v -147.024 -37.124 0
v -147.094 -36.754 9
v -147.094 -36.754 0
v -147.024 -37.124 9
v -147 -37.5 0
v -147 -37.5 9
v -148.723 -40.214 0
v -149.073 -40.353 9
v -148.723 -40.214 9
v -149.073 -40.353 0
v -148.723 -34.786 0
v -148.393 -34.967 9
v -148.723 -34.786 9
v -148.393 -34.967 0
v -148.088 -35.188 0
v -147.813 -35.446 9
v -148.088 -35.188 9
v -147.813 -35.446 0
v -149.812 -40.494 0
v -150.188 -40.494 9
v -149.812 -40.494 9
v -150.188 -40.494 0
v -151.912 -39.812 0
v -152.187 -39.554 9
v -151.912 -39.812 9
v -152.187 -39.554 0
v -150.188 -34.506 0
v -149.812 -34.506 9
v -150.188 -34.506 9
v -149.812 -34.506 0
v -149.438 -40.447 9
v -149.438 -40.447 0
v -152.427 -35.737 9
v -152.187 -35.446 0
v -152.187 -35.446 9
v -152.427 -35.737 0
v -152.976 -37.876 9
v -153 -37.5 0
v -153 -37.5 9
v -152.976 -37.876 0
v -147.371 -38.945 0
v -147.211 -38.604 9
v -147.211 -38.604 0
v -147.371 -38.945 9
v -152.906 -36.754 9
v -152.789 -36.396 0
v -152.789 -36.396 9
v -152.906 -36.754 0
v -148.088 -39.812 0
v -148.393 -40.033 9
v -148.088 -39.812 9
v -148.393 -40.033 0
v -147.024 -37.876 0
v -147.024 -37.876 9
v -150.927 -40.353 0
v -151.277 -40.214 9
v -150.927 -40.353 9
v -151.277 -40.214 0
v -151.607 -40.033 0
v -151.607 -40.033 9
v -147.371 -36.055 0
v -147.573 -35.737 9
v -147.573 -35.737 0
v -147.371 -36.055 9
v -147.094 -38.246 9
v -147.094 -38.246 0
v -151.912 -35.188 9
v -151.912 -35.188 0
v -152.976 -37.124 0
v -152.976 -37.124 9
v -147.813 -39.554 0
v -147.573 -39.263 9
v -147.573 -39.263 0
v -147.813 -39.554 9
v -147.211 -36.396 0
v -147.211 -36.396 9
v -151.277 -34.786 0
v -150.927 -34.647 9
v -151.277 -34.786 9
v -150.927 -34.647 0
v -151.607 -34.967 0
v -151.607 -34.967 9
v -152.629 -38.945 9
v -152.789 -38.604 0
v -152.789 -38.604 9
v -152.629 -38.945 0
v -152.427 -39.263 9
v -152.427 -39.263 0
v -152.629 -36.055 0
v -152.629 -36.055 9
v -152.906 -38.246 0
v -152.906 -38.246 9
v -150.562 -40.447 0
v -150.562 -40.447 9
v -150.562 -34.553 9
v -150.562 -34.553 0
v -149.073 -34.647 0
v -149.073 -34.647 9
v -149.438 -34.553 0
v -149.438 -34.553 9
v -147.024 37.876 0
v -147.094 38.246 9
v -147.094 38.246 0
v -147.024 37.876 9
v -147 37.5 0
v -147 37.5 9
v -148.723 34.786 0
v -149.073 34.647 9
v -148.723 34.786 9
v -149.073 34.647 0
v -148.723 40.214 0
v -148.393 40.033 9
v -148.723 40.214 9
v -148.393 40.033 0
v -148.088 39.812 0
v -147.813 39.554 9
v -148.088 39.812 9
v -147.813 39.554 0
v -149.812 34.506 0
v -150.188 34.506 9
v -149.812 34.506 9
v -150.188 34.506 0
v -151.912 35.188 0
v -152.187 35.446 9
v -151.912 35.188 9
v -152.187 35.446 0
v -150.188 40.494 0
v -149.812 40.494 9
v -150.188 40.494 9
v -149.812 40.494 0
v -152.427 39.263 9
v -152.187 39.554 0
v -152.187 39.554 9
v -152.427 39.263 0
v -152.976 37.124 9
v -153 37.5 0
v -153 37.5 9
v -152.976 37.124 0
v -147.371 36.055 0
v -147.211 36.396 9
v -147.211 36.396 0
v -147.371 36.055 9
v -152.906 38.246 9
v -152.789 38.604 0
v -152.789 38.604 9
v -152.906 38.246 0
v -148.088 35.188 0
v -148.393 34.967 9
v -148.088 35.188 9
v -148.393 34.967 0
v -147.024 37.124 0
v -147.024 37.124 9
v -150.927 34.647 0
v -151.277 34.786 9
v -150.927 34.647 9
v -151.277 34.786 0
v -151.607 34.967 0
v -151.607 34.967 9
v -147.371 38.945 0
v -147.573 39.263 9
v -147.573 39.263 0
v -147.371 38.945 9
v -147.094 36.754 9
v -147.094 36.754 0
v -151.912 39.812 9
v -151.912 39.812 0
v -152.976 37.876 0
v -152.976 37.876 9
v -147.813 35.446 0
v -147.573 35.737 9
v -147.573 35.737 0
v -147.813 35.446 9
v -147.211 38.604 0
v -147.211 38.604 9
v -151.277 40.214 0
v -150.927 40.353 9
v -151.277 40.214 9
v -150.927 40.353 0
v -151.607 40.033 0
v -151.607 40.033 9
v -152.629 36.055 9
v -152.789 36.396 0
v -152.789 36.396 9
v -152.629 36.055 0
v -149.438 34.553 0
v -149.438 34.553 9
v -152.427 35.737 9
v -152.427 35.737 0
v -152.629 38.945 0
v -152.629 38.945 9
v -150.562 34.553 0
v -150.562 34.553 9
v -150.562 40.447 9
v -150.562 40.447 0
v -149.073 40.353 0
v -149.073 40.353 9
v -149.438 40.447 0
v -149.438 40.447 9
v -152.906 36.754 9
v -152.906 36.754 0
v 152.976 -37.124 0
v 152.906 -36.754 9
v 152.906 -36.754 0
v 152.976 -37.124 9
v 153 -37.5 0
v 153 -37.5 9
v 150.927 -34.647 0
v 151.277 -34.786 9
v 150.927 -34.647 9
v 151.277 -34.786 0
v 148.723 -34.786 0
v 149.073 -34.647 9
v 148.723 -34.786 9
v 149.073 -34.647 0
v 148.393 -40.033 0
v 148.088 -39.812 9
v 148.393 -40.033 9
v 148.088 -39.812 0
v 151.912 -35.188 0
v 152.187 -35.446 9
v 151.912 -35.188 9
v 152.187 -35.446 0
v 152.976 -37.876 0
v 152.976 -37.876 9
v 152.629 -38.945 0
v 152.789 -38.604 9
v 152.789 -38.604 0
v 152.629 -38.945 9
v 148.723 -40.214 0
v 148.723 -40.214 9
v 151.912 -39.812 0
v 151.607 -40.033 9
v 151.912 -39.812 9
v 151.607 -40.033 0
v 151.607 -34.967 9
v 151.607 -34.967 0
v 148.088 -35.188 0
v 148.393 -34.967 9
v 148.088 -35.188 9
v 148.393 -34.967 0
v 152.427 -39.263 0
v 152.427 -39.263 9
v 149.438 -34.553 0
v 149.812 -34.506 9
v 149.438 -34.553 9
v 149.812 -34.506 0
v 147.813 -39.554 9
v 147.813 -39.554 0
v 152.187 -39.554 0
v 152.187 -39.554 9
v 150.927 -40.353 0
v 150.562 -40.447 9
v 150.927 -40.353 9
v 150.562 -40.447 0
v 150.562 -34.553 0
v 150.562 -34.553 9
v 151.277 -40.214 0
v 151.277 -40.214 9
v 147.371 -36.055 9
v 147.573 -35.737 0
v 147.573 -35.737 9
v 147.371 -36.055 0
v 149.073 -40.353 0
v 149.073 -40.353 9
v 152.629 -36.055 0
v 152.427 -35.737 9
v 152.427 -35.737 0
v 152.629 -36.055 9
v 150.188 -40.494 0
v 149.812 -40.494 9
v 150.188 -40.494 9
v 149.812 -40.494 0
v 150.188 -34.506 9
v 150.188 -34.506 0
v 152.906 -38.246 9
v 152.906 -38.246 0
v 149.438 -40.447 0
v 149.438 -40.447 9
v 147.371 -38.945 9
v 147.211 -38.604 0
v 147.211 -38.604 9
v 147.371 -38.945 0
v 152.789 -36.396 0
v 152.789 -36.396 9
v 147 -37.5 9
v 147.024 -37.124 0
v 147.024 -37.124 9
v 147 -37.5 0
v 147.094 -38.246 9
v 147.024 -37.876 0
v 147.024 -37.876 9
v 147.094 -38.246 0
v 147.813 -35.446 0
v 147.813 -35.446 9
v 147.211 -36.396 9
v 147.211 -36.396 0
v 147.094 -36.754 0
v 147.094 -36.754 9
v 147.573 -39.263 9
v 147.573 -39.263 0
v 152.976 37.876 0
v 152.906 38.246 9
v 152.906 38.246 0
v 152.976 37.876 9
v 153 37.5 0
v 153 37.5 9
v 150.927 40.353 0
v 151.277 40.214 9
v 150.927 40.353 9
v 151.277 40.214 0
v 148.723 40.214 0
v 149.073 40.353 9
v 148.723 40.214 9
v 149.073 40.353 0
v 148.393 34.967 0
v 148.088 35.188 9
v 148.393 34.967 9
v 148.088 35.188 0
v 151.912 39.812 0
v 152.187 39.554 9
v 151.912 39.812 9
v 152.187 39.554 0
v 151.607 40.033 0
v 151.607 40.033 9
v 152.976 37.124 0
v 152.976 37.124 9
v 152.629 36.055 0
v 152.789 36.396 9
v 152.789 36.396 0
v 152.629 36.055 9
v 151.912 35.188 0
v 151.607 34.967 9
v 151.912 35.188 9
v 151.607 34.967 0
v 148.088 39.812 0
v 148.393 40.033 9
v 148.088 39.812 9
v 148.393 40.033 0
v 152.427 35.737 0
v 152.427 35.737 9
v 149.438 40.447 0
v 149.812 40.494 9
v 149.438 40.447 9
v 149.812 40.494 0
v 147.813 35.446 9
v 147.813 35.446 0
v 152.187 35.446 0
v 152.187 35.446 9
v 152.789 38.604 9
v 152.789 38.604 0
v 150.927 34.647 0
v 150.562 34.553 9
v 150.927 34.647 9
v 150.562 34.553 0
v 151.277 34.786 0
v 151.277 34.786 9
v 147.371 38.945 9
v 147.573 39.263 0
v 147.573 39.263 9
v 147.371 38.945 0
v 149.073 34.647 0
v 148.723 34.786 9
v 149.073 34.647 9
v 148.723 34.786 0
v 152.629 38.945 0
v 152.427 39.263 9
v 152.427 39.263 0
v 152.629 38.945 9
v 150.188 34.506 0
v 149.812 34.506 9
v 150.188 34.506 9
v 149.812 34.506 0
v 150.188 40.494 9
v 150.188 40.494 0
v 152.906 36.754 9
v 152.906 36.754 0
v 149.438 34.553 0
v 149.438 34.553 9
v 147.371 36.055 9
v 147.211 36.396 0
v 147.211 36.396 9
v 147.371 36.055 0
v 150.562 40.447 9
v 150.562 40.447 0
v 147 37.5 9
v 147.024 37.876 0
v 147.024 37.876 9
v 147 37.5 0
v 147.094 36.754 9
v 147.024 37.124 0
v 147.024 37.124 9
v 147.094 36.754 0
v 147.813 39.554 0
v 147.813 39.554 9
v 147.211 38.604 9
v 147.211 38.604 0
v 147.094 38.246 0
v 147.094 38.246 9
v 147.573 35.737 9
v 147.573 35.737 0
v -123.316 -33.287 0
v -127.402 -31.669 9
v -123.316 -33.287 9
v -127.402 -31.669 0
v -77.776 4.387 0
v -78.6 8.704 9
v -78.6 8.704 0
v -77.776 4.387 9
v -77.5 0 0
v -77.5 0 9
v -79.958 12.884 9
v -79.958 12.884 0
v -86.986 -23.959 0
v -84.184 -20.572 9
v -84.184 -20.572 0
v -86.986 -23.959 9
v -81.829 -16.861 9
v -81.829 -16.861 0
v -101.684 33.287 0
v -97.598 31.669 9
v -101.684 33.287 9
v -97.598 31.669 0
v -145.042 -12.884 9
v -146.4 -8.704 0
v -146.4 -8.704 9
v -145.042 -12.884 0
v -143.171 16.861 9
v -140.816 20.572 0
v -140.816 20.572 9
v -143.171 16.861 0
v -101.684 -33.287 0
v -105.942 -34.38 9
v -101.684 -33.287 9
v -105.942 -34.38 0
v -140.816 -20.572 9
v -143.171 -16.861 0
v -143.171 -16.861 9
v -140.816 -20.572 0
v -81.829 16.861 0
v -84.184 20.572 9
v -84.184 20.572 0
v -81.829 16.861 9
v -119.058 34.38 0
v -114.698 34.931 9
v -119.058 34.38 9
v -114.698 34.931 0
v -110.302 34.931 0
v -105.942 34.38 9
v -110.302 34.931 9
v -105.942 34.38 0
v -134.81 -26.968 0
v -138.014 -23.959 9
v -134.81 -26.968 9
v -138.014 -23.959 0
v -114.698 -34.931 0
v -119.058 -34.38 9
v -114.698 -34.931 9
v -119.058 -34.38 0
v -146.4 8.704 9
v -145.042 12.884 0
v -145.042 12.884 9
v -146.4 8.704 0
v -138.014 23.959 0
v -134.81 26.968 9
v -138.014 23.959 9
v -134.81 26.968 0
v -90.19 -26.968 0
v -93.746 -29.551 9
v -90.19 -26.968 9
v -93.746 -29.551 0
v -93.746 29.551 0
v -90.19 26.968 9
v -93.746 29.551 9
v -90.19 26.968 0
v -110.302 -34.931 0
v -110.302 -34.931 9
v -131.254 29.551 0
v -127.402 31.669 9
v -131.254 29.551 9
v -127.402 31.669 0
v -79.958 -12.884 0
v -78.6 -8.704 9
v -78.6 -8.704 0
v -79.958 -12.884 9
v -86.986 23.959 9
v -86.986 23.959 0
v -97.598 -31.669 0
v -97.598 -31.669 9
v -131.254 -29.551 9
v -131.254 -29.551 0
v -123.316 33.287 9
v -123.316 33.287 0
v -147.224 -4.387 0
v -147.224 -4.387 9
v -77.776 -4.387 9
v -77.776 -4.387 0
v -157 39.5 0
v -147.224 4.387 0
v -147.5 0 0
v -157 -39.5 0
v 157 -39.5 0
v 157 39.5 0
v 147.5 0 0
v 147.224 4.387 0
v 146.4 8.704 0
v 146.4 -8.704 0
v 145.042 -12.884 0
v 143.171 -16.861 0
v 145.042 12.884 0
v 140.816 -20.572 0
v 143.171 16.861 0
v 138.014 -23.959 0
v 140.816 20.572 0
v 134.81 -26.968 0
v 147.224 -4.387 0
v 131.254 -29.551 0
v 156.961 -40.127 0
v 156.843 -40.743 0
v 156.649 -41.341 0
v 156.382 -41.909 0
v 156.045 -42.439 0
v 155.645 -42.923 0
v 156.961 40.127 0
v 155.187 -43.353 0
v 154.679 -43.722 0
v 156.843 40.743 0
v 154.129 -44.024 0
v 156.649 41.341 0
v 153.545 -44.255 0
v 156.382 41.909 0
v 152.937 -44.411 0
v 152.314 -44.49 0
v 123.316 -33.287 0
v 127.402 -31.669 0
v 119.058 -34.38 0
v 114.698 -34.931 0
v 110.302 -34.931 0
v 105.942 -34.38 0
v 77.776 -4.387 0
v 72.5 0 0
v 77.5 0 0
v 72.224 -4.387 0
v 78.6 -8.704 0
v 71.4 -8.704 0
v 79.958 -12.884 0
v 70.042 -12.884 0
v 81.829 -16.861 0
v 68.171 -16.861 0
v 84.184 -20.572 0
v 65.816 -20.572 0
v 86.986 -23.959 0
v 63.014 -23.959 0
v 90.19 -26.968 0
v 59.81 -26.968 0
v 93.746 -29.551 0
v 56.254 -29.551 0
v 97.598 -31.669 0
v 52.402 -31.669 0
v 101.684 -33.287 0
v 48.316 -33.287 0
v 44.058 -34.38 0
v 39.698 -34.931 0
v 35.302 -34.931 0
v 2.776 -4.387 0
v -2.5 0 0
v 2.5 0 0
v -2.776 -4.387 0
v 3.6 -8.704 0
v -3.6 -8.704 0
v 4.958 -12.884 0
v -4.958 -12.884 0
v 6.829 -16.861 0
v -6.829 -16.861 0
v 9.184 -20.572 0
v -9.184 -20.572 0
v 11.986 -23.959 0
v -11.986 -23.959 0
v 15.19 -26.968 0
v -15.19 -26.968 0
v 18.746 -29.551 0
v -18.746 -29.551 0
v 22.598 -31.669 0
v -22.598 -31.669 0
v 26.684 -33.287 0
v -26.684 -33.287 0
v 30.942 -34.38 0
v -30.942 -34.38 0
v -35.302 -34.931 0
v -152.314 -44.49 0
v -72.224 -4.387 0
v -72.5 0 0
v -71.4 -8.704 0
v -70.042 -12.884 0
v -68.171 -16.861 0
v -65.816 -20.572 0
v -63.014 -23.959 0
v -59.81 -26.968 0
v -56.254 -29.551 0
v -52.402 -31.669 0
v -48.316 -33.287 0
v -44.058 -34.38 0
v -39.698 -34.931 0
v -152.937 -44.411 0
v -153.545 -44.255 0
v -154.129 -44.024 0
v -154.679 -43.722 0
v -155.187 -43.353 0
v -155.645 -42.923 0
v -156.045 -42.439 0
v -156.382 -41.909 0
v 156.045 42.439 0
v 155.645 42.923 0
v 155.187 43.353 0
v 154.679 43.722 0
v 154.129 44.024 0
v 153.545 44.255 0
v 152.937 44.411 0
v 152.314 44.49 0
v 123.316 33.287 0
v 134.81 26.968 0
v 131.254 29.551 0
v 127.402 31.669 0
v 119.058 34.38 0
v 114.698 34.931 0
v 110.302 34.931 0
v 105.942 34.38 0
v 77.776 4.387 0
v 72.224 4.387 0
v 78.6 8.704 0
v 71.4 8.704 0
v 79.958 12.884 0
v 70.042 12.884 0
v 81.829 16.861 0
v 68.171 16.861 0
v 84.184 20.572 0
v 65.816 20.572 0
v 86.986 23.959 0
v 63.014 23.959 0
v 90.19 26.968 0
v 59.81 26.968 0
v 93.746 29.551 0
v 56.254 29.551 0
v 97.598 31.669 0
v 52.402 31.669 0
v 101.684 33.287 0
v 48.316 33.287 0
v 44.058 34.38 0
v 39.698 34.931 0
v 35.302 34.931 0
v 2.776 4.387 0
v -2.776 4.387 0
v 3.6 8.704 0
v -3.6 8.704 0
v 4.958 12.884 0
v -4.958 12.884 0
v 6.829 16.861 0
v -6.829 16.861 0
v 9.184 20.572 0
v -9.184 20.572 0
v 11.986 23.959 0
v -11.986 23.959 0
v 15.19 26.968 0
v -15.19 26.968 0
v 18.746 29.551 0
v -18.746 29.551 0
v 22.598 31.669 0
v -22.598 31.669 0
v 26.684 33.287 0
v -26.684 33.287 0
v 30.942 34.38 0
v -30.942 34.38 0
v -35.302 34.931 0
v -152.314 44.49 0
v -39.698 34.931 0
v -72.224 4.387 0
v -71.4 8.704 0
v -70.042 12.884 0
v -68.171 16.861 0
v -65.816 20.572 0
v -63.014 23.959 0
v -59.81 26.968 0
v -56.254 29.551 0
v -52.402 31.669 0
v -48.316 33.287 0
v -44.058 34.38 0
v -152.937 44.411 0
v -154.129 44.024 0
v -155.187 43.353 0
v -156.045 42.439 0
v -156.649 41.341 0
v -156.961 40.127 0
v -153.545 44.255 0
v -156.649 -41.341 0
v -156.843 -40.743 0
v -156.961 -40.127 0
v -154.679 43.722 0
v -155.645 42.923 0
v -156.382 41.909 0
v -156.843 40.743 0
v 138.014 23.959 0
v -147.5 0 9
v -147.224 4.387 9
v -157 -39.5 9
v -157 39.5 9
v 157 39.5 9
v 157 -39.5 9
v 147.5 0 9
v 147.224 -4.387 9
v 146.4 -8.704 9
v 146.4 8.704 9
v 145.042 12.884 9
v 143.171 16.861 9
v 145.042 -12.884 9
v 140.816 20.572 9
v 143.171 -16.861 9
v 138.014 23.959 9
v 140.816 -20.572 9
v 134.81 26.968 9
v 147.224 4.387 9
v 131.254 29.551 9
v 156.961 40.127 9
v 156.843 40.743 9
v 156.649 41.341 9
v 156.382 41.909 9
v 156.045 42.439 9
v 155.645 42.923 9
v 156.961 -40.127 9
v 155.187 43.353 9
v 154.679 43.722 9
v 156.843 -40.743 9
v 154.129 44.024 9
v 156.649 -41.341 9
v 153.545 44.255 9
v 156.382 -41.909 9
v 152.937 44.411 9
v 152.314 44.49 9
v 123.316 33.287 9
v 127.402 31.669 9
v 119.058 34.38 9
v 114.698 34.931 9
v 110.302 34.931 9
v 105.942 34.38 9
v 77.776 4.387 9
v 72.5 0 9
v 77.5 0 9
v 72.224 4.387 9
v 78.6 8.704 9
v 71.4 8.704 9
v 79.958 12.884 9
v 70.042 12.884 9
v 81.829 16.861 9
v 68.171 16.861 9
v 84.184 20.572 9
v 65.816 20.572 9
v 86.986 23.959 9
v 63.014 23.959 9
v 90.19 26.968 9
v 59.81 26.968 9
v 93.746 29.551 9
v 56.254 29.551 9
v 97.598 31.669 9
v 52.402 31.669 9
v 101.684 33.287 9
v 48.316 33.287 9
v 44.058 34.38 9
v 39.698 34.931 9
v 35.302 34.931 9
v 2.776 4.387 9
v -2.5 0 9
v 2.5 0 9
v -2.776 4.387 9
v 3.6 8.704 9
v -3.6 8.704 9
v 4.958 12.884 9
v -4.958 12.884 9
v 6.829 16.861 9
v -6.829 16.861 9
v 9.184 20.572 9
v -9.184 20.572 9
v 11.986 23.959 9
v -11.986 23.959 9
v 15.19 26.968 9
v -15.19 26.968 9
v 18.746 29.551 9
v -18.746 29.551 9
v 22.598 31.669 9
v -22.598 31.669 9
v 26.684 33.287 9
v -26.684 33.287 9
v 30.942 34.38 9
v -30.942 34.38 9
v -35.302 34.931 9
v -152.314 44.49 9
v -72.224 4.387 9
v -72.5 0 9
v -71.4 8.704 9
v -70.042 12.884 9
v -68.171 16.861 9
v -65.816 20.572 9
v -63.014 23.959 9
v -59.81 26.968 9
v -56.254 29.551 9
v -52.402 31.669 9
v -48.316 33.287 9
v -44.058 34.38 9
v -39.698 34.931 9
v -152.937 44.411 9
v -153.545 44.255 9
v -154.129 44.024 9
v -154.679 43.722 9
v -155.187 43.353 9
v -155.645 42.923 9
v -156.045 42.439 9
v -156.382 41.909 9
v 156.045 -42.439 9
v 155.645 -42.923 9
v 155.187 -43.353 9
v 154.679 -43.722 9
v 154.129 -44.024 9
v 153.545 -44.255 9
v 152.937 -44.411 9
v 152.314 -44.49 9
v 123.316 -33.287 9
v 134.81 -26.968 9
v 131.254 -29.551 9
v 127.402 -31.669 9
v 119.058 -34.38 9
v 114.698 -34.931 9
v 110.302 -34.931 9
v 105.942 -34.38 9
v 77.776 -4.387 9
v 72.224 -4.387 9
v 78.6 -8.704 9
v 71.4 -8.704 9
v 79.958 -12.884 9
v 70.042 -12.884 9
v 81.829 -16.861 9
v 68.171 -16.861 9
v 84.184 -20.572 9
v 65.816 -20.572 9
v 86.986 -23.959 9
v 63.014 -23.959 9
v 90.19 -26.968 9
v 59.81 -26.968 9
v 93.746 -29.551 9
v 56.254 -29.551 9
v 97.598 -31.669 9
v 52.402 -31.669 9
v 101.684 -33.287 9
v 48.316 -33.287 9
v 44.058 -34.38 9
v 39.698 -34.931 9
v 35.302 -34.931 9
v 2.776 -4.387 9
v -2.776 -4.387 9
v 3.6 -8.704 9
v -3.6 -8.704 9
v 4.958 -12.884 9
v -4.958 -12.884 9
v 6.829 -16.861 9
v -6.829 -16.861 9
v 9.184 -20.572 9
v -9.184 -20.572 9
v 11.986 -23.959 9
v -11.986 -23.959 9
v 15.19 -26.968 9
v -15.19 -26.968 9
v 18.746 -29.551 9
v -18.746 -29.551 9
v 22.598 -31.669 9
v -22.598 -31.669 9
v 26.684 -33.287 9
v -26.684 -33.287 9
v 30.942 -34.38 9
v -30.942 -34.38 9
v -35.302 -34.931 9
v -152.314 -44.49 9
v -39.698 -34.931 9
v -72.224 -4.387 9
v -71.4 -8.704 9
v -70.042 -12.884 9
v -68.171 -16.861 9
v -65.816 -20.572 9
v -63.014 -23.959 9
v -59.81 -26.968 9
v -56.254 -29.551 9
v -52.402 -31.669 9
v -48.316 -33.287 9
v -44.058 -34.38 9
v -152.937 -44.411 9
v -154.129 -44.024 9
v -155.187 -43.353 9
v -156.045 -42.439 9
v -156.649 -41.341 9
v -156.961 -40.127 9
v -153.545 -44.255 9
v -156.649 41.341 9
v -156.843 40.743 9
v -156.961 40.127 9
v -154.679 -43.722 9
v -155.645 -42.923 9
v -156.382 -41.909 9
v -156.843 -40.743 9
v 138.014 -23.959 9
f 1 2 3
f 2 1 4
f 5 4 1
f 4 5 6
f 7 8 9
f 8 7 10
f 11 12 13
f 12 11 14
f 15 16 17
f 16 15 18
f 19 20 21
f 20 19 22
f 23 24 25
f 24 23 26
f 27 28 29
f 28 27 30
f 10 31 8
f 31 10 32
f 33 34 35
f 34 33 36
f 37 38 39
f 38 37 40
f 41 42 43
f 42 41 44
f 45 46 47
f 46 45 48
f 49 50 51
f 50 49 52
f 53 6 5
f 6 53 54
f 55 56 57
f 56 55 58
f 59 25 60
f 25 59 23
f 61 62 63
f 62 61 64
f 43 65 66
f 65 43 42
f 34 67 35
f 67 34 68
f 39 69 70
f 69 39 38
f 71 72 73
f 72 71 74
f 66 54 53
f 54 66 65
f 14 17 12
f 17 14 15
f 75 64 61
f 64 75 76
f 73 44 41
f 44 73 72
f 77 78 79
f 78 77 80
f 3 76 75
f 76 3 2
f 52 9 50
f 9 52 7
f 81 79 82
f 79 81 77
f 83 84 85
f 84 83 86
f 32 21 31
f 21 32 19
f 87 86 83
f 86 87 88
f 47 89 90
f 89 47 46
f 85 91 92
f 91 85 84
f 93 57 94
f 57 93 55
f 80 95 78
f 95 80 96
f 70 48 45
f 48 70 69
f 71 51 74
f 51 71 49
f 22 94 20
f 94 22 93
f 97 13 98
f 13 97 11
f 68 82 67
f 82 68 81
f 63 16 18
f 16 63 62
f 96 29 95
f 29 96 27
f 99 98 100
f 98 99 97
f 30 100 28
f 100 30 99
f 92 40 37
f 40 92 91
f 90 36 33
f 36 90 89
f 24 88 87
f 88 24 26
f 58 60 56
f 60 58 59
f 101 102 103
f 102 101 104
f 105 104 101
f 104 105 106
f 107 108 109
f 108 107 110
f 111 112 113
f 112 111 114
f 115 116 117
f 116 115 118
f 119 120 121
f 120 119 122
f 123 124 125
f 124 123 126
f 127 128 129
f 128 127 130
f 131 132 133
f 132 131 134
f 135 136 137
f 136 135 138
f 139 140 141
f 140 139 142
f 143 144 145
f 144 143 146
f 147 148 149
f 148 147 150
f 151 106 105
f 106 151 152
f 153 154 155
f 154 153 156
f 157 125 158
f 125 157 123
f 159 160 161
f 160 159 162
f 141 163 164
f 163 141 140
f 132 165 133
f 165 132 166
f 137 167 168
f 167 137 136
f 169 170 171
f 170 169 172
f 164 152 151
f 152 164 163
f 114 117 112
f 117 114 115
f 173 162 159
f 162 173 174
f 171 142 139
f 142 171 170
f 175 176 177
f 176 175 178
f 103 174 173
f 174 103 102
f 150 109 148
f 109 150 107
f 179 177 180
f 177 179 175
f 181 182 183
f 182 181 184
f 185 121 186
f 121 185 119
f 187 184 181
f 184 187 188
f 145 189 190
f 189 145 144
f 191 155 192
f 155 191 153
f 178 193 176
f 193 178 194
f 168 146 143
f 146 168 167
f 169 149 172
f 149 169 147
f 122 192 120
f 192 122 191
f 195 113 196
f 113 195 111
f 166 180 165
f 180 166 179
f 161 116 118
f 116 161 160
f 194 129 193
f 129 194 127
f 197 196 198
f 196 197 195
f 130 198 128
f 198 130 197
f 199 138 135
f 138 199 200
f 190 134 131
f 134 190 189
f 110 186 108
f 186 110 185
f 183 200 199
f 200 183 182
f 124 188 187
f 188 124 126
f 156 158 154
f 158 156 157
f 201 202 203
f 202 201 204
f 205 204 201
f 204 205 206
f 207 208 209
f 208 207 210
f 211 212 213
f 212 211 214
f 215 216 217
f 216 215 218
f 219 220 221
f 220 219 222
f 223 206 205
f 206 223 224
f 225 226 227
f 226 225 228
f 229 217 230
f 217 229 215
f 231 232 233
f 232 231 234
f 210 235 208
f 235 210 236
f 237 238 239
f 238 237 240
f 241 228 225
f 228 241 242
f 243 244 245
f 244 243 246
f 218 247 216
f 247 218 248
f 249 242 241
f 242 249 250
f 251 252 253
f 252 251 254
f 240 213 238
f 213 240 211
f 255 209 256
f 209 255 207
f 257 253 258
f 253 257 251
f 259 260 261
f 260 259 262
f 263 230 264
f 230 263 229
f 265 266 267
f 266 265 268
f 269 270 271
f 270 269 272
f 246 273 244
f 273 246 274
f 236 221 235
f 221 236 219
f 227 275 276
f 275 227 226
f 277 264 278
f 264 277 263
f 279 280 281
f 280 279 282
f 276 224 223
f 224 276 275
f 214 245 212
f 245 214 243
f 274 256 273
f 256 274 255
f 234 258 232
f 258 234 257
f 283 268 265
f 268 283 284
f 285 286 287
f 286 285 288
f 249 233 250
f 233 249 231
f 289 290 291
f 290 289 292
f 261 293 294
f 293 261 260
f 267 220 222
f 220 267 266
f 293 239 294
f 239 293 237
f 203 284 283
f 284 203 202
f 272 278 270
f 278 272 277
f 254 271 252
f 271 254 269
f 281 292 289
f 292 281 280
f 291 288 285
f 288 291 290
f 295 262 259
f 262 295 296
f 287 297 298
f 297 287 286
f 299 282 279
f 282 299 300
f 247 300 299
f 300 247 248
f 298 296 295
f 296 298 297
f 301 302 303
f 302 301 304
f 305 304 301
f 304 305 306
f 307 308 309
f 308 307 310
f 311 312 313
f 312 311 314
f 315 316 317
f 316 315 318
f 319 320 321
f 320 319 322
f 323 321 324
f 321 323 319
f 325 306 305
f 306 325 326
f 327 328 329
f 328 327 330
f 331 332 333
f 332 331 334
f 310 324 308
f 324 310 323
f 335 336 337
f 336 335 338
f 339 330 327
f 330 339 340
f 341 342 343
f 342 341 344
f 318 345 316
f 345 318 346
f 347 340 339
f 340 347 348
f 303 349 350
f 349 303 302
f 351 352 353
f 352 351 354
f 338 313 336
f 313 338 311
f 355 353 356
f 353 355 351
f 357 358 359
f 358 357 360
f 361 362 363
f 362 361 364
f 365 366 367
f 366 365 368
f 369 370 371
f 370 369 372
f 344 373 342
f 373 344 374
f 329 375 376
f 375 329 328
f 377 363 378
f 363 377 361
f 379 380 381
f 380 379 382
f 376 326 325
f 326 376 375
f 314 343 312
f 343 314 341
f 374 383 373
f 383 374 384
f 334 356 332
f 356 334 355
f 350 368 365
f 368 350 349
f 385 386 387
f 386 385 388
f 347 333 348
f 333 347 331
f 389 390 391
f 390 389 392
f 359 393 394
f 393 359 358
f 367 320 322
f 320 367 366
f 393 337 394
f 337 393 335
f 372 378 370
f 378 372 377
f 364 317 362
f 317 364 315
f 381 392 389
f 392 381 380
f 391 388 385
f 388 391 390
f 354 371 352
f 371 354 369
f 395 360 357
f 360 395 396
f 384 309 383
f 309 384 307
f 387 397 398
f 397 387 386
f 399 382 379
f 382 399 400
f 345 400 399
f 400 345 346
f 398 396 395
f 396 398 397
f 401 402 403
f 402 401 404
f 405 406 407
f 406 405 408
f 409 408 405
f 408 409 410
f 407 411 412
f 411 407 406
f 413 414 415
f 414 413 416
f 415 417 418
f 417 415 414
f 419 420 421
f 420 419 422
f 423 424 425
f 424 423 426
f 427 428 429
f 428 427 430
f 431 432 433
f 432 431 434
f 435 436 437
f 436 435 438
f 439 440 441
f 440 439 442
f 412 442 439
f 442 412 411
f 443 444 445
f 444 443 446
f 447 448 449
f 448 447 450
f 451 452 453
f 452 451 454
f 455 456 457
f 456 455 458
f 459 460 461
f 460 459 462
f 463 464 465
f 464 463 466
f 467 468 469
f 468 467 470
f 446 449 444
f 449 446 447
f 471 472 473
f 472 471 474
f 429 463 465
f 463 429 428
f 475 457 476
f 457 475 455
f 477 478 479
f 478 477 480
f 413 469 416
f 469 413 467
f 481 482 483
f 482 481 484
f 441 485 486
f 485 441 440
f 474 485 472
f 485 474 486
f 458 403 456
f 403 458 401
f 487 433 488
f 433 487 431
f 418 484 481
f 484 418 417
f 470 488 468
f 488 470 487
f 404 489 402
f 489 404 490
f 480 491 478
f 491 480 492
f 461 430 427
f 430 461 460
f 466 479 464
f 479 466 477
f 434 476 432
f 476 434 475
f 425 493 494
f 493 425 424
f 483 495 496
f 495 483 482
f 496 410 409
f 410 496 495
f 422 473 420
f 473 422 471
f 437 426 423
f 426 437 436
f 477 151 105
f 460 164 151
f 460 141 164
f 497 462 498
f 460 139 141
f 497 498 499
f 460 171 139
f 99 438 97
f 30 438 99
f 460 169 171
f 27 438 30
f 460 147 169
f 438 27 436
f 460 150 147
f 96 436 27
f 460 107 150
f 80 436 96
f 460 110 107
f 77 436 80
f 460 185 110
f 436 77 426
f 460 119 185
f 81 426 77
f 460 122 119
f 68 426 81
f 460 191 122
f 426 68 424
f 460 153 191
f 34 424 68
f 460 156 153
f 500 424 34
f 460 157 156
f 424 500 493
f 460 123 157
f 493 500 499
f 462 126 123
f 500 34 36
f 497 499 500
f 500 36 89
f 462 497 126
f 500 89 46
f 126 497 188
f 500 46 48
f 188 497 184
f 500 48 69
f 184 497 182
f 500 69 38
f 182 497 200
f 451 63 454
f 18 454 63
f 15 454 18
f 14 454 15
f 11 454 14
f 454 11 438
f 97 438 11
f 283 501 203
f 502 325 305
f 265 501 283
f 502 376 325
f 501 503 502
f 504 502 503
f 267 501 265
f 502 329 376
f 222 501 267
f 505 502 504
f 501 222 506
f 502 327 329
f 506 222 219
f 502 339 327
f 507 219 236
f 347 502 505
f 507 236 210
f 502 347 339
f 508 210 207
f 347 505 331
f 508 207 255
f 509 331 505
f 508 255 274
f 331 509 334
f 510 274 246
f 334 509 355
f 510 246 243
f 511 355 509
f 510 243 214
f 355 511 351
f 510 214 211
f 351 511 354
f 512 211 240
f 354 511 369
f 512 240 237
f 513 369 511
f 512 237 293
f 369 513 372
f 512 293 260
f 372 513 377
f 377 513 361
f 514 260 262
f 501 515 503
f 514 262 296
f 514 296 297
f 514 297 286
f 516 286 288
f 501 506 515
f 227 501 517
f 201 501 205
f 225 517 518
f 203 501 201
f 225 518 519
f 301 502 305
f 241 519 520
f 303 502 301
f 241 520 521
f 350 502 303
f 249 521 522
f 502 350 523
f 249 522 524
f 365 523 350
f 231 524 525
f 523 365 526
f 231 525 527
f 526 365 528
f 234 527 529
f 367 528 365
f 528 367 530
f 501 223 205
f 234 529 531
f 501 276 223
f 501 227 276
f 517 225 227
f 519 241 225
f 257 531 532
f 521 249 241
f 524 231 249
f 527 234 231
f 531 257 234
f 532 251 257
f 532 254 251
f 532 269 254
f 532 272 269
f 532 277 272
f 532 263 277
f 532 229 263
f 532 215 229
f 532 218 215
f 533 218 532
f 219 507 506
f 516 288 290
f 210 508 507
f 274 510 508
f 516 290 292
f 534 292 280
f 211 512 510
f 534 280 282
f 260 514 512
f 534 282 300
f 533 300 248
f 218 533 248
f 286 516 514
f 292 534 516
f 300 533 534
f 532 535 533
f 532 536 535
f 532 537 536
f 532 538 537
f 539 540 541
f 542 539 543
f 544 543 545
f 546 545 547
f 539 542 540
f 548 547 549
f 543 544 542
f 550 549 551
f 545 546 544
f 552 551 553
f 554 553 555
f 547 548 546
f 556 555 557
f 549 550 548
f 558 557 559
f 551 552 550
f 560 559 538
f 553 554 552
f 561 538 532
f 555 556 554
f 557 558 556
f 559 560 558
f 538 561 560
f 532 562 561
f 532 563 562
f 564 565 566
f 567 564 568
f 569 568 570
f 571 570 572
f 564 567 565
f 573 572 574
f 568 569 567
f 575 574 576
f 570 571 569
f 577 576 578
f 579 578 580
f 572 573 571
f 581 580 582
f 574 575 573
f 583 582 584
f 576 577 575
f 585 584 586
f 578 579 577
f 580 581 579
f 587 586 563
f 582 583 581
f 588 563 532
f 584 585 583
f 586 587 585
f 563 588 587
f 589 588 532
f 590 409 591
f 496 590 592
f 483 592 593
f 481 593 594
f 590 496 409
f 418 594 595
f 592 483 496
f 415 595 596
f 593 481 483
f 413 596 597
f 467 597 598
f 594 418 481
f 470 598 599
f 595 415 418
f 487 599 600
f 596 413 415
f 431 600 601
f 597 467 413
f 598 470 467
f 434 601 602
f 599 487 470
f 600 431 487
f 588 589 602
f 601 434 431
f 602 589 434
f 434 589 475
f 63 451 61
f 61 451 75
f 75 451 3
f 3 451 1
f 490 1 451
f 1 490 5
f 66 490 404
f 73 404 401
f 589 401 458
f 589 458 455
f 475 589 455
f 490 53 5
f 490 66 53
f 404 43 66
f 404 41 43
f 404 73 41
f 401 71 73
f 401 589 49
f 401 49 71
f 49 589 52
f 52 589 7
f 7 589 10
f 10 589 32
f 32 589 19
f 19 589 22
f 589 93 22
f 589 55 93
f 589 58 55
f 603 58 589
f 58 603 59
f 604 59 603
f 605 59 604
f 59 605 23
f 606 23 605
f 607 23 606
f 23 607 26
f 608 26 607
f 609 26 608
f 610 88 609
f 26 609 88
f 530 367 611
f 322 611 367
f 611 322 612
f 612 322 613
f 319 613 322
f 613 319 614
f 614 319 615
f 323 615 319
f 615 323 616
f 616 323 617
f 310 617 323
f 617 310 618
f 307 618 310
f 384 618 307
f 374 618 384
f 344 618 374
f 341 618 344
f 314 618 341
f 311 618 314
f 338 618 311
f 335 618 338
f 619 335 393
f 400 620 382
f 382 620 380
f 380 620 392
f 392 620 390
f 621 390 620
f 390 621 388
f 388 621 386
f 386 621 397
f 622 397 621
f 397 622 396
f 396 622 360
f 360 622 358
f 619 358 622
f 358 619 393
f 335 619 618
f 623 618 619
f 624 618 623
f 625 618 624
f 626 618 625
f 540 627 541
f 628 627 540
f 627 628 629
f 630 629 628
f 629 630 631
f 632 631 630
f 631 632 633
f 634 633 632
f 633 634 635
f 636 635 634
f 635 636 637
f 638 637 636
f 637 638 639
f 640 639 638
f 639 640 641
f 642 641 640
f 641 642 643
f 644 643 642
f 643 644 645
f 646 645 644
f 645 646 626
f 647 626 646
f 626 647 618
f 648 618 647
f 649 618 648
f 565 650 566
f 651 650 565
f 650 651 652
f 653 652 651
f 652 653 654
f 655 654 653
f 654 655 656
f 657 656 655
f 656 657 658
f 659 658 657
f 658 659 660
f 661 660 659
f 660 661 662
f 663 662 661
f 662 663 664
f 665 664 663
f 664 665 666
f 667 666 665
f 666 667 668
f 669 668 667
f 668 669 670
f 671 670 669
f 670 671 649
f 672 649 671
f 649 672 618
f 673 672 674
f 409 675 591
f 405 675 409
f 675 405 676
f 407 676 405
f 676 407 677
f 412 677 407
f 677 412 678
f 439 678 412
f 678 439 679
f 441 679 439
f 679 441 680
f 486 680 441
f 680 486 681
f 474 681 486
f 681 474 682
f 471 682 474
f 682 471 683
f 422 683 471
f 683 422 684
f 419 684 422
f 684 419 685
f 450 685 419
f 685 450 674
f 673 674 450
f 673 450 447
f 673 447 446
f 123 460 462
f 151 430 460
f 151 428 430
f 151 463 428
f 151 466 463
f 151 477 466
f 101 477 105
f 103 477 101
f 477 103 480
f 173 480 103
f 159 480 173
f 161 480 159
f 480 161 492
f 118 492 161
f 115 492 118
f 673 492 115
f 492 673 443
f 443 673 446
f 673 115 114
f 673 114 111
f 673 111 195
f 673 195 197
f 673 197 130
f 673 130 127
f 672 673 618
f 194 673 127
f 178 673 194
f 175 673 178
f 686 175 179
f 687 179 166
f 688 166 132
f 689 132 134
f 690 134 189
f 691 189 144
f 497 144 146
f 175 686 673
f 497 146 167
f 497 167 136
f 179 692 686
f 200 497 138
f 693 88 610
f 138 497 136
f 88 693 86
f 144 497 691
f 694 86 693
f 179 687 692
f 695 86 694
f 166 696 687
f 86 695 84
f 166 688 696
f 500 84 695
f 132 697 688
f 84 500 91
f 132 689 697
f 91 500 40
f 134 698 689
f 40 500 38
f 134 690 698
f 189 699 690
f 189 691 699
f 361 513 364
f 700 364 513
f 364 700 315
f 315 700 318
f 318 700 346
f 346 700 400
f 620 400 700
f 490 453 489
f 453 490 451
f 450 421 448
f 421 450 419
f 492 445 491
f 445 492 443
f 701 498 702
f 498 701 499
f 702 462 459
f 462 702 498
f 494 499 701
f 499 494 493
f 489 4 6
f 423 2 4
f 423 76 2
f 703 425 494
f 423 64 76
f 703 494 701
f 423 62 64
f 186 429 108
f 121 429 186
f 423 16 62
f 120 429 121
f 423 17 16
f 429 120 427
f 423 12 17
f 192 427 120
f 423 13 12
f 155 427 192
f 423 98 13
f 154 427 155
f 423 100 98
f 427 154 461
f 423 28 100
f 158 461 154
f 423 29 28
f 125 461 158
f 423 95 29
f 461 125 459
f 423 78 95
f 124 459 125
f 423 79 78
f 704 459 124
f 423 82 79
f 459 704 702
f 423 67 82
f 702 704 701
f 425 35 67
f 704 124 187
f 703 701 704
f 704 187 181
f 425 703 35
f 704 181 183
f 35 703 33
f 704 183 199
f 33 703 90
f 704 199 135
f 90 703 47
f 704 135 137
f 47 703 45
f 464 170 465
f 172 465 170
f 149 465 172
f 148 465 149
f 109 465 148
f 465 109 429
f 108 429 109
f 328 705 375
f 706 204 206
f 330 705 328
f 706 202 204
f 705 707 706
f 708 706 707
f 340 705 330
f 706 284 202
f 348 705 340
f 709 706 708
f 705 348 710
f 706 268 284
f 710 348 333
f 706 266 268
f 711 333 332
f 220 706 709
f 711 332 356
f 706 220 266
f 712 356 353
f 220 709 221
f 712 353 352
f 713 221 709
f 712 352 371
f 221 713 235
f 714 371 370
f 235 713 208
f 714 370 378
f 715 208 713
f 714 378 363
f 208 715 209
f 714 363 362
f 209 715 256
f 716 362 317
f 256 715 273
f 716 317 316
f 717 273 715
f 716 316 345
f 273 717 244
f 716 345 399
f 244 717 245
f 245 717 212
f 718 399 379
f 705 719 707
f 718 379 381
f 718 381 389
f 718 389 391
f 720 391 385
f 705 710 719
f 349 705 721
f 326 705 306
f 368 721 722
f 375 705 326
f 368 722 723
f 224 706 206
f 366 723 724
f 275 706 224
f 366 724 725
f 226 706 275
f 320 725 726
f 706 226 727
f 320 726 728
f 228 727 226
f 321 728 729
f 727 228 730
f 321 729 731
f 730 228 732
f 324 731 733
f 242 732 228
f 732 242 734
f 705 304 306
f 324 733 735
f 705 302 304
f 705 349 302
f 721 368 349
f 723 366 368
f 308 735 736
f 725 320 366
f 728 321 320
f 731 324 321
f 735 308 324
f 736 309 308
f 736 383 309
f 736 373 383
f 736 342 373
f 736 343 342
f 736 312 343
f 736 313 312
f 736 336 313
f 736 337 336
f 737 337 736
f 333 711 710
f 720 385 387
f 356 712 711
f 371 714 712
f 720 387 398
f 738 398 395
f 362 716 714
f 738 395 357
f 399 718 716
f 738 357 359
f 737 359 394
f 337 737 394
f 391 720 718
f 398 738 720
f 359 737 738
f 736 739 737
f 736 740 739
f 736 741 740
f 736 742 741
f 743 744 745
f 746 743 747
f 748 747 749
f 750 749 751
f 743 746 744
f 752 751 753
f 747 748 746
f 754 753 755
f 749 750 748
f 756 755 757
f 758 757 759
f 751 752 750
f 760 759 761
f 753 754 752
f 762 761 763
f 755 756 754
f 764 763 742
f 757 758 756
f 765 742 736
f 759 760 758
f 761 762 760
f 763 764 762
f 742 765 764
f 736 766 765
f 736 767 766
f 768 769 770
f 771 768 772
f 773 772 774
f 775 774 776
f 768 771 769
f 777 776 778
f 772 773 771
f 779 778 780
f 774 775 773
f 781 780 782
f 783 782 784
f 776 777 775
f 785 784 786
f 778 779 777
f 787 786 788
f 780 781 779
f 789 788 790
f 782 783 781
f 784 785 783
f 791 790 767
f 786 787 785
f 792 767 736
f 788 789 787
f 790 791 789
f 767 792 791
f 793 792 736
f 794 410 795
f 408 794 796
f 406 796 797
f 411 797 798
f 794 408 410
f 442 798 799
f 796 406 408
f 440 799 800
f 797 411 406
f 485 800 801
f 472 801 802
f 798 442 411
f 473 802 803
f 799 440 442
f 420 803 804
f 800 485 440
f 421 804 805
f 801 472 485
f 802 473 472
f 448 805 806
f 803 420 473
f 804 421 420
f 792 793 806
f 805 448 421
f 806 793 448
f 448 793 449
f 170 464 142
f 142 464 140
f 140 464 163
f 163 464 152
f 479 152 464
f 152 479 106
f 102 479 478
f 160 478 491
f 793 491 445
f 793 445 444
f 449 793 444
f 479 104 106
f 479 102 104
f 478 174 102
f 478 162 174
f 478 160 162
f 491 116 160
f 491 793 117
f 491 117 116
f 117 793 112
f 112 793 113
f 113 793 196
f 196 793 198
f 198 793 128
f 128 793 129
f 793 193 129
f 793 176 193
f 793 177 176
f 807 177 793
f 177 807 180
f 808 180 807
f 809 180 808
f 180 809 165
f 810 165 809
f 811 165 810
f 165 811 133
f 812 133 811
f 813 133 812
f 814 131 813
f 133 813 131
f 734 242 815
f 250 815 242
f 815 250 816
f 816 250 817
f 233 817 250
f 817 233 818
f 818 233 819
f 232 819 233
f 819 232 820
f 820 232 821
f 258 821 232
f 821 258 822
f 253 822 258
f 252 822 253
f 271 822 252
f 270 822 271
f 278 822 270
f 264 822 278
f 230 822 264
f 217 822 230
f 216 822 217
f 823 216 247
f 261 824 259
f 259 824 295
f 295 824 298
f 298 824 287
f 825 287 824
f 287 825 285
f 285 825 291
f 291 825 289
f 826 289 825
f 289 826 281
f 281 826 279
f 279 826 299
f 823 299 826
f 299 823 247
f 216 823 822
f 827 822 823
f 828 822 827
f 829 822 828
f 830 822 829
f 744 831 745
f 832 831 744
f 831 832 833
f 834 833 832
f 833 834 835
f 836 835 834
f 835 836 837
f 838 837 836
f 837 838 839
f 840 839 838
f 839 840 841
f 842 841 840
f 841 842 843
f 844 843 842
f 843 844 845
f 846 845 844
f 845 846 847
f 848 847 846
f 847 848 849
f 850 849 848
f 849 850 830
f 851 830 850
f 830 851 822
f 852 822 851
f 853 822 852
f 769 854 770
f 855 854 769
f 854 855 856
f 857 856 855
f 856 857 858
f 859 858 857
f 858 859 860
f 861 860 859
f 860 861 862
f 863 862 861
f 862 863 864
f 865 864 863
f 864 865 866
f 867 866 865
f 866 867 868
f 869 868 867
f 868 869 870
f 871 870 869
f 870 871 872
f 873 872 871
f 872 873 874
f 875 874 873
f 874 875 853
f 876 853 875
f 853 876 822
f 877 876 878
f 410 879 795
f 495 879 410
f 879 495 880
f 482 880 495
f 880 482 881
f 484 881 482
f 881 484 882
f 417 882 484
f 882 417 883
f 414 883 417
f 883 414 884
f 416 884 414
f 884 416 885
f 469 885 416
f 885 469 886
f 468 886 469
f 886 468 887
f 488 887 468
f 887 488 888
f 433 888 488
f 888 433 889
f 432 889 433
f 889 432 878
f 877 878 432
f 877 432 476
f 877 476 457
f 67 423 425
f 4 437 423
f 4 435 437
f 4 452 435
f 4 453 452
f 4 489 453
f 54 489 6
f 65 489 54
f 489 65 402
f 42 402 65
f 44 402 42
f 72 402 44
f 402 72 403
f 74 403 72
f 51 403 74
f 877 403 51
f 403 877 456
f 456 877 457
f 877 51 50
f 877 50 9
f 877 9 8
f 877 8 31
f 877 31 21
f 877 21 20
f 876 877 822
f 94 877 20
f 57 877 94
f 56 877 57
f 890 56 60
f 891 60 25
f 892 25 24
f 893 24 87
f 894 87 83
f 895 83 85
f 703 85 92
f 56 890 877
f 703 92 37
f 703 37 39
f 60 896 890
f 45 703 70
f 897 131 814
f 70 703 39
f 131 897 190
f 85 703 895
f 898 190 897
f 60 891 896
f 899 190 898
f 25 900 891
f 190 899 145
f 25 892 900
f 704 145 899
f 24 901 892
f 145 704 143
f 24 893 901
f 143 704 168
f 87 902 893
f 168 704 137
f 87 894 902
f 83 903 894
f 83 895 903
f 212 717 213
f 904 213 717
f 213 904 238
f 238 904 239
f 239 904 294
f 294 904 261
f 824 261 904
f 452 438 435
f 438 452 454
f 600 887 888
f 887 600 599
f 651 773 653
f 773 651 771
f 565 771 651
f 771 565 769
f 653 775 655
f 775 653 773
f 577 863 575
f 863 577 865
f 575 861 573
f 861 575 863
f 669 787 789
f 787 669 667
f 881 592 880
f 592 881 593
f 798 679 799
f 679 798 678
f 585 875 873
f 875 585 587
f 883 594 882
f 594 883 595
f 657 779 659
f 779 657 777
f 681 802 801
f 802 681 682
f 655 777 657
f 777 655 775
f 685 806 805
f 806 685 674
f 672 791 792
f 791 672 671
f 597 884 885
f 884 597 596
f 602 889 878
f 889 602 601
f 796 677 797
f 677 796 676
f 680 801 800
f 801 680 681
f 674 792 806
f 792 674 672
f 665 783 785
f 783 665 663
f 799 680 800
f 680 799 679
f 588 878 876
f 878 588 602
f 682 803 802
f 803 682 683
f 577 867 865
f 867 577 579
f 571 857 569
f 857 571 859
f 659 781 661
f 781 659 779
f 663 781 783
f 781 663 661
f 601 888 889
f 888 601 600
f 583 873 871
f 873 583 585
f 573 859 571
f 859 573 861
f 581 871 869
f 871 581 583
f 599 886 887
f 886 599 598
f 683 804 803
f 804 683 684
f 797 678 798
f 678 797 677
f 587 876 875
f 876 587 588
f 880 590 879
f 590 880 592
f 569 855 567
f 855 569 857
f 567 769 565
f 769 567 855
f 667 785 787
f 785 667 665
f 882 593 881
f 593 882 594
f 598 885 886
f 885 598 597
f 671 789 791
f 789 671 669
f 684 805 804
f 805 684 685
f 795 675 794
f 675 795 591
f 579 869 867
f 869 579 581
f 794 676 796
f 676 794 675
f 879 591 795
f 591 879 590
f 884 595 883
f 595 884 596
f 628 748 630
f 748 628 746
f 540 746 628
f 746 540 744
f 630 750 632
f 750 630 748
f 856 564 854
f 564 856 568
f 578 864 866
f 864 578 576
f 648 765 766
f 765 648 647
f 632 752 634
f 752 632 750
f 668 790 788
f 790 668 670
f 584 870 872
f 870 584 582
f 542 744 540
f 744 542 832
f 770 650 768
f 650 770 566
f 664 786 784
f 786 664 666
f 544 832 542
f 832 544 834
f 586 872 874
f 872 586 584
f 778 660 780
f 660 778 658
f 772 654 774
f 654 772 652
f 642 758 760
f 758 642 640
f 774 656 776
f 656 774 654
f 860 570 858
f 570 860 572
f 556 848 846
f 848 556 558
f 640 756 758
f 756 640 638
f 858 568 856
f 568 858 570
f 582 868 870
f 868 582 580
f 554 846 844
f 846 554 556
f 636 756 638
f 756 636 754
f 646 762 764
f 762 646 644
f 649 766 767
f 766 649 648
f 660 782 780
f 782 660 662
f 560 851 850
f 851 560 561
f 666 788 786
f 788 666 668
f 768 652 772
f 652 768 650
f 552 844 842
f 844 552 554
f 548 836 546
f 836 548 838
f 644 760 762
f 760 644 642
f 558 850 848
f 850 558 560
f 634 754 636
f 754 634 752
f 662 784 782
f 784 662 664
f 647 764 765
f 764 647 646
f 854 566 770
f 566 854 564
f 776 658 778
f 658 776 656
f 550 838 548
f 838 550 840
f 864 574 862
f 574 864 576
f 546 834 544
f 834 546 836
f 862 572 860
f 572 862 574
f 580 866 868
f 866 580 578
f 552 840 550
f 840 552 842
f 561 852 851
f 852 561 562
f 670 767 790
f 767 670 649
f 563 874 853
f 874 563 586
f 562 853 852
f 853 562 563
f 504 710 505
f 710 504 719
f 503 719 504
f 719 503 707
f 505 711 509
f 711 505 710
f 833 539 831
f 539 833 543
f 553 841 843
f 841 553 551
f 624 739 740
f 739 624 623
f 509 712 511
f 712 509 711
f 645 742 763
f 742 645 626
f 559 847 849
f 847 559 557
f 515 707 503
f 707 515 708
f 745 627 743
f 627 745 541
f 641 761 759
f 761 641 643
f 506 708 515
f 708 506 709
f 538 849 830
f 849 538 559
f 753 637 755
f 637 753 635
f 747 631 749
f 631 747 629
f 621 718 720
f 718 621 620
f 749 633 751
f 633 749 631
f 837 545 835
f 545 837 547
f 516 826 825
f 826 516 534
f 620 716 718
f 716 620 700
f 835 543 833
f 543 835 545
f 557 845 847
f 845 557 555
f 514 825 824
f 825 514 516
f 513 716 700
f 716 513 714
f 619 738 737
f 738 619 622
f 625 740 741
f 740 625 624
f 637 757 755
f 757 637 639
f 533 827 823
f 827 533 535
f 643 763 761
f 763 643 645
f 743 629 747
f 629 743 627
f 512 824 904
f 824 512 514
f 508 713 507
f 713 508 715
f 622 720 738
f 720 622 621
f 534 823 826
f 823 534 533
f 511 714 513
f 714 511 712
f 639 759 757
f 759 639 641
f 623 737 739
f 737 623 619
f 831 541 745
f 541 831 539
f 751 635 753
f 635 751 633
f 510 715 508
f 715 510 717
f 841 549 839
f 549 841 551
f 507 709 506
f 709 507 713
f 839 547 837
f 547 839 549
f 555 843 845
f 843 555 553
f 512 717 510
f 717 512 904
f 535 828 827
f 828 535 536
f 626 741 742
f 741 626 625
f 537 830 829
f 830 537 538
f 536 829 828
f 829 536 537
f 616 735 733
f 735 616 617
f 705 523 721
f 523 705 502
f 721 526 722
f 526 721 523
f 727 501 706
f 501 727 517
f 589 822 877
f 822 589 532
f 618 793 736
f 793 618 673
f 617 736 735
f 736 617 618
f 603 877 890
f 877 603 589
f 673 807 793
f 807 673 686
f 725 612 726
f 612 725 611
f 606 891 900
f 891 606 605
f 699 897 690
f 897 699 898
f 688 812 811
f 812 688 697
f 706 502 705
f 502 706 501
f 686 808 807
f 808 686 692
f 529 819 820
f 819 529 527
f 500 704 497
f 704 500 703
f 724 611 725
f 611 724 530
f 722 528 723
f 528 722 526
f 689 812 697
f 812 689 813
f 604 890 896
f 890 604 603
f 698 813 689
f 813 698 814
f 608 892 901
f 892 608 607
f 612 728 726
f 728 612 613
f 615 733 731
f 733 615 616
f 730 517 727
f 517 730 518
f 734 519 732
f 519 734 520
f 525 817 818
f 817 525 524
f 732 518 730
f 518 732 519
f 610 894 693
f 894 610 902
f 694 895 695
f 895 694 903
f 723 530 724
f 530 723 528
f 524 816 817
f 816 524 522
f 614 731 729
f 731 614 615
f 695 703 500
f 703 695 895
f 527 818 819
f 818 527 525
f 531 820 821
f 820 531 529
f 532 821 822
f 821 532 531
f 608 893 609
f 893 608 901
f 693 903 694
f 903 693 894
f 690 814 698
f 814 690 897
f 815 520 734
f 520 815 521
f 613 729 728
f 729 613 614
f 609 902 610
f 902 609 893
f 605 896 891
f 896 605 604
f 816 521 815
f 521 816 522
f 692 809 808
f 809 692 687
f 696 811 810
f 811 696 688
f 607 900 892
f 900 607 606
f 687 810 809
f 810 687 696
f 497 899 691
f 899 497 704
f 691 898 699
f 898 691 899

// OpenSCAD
$fn = 50;


difference() {
	union() {
		hull() {
			translate(v = [-152.0000000000, 39.5000000000, 0]) {
				cylinder(h = 9, r = 5);
			}
			translate(v = [152.0000000000, 39.5000000000, 0]) {
				cylinder(h = 9, r = 5);
			}
			translate(v = [-152.0000000000, -39.5000000000, 0]) {
				cylinder(h = 9, r = 5);
			}
			translate(v = [152.0000000000, -39.5000000000, 0]) {
				cylinder(h = 9, r = 5);
			}
		}
	}
	union() {
		#translate(v = [-150.0000000000, -37.5000000000, -100.0000000000]) {
			cylinder(h = 200, r = 3.0000000000);
		}
		#translate(v = [-150.0000000000, 37.5000000000, -100.0000000000]) {
			cylinder(h = 200, r = 3.0000000000);
		}
		#translate(v = [150.0000000000, -37.5000000000, -100.0000000000]) {
			cylinder(h = 200, r = 3.0000000000);
		}
		#translate(v = [150.0000000000, 37.5000000000, -100.0000000000]) {
			cylinder(h = 200, r = 3.0000000000);
		}
		#translate(v = [-112.5000000000, 0, 0]) {
			cylinder(h = 9, r = 35.0000000000);
		}
		#translate(v = [-37.5000000000, 0, 0]) {
			cylinder(h = 9, r = 35.0000000000);
		}
		#translate(v = [37.5000000000, 0, 0]) {
			cylinder(h = 9, r = 35.0000000000);
		}
		#translate(v = [112.5000000000, 0, 0]) {
			cylinder(h = 9, r = 35.0000000000);
		}
	}
}
